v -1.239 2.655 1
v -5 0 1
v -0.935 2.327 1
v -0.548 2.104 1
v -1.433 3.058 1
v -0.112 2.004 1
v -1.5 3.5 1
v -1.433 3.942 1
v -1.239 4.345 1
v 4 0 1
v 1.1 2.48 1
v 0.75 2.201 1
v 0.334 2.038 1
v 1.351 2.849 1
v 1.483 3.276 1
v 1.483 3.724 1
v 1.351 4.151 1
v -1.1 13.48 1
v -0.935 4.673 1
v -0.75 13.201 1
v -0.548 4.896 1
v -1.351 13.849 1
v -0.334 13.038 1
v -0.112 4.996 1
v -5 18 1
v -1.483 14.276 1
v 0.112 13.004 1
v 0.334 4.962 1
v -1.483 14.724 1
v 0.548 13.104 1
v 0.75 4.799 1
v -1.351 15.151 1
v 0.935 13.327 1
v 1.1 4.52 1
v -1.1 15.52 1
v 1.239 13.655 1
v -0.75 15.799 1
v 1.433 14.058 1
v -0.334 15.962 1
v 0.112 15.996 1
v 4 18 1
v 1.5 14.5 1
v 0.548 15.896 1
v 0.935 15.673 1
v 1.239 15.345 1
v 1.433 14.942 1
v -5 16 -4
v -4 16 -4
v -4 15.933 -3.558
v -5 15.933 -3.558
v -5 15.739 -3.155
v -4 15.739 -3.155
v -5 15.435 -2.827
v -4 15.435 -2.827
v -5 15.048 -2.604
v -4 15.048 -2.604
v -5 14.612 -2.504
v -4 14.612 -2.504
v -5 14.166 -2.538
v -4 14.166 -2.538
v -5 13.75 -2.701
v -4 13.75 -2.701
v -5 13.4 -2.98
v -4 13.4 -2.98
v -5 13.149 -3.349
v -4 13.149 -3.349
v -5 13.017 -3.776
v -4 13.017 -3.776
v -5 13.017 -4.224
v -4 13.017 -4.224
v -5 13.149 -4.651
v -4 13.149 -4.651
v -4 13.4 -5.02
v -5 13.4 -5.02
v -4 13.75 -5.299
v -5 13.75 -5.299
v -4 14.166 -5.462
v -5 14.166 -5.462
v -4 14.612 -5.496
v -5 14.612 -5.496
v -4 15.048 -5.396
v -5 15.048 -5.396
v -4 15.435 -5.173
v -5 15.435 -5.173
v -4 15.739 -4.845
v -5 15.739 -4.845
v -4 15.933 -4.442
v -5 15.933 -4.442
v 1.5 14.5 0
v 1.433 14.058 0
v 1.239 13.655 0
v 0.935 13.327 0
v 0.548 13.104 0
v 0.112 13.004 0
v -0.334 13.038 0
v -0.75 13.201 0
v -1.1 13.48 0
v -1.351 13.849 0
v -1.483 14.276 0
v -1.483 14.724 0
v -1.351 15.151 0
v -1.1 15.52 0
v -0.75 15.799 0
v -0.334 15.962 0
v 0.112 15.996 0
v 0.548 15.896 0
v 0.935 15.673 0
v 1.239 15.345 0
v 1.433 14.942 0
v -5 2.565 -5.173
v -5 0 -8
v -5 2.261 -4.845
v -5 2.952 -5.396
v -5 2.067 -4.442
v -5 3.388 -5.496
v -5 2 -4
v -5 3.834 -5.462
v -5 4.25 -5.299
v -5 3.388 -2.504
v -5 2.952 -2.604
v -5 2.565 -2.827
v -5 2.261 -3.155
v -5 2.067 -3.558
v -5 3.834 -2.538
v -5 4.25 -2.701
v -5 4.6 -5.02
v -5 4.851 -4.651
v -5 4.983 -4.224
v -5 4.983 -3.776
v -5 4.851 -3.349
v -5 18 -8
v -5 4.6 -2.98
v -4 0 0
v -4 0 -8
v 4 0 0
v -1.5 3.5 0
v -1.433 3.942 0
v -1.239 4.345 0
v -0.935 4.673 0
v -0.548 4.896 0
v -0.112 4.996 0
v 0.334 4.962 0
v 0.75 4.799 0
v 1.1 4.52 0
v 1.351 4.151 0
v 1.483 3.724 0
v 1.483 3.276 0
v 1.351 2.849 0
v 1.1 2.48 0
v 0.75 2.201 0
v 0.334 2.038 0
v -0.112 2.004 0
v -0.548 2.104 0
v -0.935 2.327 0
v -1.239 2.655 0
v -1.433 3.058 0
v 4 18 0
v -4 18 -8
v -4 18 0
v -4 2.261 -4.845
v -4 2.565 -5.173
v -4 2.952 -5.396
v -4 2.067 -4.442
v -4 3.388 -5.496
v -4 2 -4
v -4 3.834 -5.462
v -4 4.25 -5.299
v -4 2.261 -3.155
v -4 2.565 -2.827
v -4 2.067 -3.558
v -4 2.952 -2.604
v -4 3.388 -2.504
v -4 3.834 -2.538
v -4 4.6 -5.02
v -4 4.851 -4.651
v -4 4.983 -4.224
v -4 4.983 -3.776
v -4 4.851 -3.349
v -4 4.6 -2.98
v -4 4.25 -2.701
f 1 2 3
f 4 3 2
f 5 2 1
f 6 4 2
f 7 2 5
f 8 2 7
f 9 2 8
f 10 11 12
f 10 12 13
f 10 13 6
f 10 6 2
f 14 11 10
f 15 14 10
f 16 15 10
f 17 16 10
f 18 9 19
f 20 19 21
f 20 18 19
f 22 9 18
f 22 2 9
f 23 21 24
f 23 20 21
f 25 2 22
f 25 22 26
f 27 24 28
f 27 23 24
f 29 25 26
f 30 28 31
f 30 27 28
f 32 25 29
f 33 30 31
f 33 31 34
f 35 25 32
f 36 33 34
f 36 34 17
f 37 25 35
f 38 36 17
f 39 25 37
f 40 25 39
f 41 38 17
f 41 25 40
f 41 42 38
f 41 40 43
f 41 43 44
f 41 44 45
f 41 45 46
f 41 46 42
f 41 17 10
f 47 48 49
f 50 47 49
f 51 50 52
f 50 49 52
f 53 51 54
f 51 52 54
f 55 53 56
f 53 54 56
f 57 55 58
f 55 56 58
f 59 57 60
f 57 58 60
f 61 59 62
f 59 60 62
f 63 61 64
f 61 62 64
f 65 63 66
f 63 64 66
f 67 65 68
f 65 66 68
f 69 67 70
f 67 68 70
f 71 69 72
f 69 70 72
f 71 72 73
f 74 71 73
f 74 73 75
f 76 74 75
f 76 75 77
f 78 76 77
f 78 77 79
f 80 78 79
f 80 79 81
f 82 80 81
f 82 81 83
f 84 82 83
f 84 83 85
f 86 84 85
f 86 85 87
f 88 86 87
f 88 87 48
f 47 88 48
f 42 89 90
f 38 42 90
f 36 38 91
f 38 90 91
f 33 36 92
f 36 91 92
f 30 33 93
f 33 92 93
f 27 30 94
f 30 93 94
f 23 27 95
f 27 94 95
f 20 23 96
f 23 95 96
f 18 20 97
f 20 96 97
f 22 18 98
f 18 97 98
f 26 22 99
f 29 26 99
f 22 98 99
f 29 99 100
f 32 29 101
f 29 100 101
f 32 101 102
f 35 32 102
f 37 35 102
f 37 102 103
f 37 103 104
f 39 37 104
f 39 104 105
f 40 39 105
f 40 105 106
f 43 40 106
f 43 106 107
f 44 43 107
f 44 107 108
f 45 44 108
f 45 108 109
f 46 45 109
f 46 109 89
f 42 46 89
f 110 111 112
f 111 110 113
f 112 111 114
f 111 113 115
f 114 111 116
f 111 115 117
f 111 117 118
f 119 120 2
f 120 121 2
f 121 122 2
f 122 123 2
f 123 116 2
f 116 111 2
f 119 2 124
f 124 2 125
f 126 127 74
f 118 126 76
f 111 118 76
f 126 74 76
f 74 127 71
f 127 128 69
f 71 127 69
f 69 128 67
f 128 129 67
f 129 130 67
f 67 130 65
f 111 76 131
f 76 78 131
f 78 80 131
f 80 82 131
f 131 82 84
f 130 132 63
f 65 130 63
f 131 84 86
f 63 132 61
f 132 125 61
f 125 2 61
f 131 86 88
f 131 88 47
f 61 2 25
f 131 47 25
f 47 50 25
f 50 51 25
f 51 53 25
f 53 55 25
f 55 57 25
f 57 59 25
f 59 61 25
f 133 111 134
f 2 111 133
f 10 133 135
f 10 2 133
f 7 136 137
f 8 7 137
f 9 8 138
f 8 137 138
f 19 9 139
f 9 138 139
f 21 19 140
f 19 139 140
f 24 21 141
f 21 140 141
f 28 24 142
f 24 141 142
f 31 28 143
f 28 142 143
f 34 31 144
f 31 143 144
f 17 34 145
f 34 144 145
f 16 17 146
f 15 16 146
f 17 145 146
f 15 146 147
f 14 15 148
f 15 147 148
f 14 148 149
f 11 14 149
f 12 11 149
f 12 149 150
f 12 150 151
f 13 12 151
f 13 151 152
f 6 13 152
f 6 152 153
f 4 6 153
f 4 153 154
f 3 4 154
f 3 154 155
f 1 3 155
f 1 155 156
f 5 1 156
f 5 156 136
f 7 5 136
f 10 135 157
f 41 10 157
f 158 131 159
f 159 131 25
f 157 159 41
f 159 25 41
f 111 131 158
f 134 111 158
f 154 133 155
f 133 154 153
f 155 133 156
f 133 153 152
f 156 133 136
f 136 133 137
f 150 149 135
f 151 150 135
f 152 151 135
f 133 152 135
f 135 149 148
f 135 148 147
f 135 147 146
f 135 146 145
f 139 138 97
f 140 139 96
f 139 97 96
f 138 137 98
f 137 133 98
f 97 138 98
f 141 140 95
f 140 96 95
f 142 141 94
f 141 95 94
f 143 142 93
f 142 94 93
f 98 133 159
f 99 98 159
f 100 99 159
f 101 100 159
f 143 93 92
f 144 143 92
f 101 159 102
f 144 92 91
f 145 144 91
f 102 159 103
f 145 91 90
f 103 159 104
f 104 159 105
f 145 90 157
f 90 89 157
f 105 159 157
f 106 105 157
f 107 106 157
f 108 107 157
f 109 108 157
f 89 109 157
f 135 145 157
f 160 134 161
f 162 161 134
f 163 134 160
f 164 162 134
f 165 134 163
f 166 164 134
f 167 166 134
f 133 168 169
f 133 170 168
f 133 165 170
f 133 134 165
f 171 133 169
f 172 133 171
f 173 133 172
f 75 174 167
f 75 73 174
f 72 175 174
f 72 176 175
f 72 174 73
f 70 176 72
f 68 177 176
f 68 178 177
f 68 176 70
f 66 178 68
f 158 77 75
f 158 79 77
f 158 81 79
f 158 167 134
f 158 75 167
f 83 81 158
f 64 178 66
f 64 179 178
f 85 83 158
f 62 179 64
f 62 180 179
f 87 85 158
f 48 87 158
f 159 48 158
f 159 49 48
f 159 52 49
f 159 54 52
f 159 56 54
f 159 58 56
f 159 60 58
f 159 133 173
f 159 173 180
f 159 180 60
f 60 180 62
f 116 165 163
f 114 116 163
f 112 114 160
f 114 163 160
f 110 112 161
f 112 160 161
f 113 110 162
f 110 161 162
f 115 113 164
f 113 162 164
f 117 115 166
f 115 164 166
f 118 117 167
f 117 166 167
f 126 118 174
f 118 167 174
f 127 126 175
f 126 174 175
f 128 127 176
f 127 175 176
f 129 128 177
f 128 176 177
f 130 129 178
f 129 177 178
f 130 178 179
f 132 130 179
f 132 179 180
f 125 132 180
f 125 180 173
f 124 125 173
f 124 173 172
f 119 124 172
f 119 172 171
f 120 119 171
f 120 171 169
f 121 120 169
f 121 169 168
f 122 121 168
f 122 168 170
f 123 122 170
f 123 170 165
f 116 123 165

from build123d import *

# Parameters (mm, degrees)
ESQUISSE1_W             = 8
ESQUISSE1_H             = 18
BOSS_EXTRU_1_DEPTH      = 1
ESQUISSE2_W             = 1
ESQUISSE2_H             = 18
BOSS_EXTRU_2_DEPTH      = 9
ESQUISSE3_R             = 1.5
ENL_V_MAT_EXTRU_1_DEPTH = 22.260291625
ESQUISSE4_R             = 1.5
ENL_V_MAT_EXTRU_2_DEPTH = 21.322401433


with BuildPart() as part:
    # Esquisse1 → Boss.-Extru.1 (new body)
    with BuildSketch(Plane.XY):
        with Locations((0, 9)):
            Rectangle(ESQUISSE1_W, ESQUISSE1_H)
    extrude(amount=BOSS_EXTRU_1_DEPTH)

    # Esquisse2 → Boss.-Extru.2 (add)
    with BuildSketch(Plane.XY.offset(1)):
        with Locations((-4.5, 9)):
            Rectangle(ESQUISSE2_W, ESQUISSE2_H)
    extrude(amount=-BOSS_EXTRU_2_DEPTH)

    # Esquisse3 → Enlèv. mat.-Extru.1 (cut, through all)
    with BuildSketch(Plane(origin=(-4, 0, 0), x_dir=(0, 0, -1), z_dir=(1, 0, 0))):
        with Locations(Location((4, 14.5, 0), (0, 0, 90))):
            Circle(ESQUISSE3_R)
        with Locations(Location((4, 3.5, 0), (0, 0, 270))):
            Circle(ESQUISSE3_R)
    extrude(amount=-ENL_V_MAT_EXTRU_1_DEPTH, mode=Mode.SUBTRACT)

    # Esquisse4 → Enlèv. mat.-Extru.2 (cut, through all)
    with BuildSketch(Plane(origin=(0, 0, 0), x_dir=(-1, 0, 0), z_dir=(0, 0, -1))):
        with Locations((0, 3.5)):
            Circle(ESQUISSE4_R)
        with Locations(Location((0, 14.5, 0), (0, 0, 180))):
            Circle(ESQUISSE4_R)
    extrude(amount=-ENL_V_MAT_EXTRU_2_DEPTH, mode=Mode.SUBTRACT)


solid = part.part
